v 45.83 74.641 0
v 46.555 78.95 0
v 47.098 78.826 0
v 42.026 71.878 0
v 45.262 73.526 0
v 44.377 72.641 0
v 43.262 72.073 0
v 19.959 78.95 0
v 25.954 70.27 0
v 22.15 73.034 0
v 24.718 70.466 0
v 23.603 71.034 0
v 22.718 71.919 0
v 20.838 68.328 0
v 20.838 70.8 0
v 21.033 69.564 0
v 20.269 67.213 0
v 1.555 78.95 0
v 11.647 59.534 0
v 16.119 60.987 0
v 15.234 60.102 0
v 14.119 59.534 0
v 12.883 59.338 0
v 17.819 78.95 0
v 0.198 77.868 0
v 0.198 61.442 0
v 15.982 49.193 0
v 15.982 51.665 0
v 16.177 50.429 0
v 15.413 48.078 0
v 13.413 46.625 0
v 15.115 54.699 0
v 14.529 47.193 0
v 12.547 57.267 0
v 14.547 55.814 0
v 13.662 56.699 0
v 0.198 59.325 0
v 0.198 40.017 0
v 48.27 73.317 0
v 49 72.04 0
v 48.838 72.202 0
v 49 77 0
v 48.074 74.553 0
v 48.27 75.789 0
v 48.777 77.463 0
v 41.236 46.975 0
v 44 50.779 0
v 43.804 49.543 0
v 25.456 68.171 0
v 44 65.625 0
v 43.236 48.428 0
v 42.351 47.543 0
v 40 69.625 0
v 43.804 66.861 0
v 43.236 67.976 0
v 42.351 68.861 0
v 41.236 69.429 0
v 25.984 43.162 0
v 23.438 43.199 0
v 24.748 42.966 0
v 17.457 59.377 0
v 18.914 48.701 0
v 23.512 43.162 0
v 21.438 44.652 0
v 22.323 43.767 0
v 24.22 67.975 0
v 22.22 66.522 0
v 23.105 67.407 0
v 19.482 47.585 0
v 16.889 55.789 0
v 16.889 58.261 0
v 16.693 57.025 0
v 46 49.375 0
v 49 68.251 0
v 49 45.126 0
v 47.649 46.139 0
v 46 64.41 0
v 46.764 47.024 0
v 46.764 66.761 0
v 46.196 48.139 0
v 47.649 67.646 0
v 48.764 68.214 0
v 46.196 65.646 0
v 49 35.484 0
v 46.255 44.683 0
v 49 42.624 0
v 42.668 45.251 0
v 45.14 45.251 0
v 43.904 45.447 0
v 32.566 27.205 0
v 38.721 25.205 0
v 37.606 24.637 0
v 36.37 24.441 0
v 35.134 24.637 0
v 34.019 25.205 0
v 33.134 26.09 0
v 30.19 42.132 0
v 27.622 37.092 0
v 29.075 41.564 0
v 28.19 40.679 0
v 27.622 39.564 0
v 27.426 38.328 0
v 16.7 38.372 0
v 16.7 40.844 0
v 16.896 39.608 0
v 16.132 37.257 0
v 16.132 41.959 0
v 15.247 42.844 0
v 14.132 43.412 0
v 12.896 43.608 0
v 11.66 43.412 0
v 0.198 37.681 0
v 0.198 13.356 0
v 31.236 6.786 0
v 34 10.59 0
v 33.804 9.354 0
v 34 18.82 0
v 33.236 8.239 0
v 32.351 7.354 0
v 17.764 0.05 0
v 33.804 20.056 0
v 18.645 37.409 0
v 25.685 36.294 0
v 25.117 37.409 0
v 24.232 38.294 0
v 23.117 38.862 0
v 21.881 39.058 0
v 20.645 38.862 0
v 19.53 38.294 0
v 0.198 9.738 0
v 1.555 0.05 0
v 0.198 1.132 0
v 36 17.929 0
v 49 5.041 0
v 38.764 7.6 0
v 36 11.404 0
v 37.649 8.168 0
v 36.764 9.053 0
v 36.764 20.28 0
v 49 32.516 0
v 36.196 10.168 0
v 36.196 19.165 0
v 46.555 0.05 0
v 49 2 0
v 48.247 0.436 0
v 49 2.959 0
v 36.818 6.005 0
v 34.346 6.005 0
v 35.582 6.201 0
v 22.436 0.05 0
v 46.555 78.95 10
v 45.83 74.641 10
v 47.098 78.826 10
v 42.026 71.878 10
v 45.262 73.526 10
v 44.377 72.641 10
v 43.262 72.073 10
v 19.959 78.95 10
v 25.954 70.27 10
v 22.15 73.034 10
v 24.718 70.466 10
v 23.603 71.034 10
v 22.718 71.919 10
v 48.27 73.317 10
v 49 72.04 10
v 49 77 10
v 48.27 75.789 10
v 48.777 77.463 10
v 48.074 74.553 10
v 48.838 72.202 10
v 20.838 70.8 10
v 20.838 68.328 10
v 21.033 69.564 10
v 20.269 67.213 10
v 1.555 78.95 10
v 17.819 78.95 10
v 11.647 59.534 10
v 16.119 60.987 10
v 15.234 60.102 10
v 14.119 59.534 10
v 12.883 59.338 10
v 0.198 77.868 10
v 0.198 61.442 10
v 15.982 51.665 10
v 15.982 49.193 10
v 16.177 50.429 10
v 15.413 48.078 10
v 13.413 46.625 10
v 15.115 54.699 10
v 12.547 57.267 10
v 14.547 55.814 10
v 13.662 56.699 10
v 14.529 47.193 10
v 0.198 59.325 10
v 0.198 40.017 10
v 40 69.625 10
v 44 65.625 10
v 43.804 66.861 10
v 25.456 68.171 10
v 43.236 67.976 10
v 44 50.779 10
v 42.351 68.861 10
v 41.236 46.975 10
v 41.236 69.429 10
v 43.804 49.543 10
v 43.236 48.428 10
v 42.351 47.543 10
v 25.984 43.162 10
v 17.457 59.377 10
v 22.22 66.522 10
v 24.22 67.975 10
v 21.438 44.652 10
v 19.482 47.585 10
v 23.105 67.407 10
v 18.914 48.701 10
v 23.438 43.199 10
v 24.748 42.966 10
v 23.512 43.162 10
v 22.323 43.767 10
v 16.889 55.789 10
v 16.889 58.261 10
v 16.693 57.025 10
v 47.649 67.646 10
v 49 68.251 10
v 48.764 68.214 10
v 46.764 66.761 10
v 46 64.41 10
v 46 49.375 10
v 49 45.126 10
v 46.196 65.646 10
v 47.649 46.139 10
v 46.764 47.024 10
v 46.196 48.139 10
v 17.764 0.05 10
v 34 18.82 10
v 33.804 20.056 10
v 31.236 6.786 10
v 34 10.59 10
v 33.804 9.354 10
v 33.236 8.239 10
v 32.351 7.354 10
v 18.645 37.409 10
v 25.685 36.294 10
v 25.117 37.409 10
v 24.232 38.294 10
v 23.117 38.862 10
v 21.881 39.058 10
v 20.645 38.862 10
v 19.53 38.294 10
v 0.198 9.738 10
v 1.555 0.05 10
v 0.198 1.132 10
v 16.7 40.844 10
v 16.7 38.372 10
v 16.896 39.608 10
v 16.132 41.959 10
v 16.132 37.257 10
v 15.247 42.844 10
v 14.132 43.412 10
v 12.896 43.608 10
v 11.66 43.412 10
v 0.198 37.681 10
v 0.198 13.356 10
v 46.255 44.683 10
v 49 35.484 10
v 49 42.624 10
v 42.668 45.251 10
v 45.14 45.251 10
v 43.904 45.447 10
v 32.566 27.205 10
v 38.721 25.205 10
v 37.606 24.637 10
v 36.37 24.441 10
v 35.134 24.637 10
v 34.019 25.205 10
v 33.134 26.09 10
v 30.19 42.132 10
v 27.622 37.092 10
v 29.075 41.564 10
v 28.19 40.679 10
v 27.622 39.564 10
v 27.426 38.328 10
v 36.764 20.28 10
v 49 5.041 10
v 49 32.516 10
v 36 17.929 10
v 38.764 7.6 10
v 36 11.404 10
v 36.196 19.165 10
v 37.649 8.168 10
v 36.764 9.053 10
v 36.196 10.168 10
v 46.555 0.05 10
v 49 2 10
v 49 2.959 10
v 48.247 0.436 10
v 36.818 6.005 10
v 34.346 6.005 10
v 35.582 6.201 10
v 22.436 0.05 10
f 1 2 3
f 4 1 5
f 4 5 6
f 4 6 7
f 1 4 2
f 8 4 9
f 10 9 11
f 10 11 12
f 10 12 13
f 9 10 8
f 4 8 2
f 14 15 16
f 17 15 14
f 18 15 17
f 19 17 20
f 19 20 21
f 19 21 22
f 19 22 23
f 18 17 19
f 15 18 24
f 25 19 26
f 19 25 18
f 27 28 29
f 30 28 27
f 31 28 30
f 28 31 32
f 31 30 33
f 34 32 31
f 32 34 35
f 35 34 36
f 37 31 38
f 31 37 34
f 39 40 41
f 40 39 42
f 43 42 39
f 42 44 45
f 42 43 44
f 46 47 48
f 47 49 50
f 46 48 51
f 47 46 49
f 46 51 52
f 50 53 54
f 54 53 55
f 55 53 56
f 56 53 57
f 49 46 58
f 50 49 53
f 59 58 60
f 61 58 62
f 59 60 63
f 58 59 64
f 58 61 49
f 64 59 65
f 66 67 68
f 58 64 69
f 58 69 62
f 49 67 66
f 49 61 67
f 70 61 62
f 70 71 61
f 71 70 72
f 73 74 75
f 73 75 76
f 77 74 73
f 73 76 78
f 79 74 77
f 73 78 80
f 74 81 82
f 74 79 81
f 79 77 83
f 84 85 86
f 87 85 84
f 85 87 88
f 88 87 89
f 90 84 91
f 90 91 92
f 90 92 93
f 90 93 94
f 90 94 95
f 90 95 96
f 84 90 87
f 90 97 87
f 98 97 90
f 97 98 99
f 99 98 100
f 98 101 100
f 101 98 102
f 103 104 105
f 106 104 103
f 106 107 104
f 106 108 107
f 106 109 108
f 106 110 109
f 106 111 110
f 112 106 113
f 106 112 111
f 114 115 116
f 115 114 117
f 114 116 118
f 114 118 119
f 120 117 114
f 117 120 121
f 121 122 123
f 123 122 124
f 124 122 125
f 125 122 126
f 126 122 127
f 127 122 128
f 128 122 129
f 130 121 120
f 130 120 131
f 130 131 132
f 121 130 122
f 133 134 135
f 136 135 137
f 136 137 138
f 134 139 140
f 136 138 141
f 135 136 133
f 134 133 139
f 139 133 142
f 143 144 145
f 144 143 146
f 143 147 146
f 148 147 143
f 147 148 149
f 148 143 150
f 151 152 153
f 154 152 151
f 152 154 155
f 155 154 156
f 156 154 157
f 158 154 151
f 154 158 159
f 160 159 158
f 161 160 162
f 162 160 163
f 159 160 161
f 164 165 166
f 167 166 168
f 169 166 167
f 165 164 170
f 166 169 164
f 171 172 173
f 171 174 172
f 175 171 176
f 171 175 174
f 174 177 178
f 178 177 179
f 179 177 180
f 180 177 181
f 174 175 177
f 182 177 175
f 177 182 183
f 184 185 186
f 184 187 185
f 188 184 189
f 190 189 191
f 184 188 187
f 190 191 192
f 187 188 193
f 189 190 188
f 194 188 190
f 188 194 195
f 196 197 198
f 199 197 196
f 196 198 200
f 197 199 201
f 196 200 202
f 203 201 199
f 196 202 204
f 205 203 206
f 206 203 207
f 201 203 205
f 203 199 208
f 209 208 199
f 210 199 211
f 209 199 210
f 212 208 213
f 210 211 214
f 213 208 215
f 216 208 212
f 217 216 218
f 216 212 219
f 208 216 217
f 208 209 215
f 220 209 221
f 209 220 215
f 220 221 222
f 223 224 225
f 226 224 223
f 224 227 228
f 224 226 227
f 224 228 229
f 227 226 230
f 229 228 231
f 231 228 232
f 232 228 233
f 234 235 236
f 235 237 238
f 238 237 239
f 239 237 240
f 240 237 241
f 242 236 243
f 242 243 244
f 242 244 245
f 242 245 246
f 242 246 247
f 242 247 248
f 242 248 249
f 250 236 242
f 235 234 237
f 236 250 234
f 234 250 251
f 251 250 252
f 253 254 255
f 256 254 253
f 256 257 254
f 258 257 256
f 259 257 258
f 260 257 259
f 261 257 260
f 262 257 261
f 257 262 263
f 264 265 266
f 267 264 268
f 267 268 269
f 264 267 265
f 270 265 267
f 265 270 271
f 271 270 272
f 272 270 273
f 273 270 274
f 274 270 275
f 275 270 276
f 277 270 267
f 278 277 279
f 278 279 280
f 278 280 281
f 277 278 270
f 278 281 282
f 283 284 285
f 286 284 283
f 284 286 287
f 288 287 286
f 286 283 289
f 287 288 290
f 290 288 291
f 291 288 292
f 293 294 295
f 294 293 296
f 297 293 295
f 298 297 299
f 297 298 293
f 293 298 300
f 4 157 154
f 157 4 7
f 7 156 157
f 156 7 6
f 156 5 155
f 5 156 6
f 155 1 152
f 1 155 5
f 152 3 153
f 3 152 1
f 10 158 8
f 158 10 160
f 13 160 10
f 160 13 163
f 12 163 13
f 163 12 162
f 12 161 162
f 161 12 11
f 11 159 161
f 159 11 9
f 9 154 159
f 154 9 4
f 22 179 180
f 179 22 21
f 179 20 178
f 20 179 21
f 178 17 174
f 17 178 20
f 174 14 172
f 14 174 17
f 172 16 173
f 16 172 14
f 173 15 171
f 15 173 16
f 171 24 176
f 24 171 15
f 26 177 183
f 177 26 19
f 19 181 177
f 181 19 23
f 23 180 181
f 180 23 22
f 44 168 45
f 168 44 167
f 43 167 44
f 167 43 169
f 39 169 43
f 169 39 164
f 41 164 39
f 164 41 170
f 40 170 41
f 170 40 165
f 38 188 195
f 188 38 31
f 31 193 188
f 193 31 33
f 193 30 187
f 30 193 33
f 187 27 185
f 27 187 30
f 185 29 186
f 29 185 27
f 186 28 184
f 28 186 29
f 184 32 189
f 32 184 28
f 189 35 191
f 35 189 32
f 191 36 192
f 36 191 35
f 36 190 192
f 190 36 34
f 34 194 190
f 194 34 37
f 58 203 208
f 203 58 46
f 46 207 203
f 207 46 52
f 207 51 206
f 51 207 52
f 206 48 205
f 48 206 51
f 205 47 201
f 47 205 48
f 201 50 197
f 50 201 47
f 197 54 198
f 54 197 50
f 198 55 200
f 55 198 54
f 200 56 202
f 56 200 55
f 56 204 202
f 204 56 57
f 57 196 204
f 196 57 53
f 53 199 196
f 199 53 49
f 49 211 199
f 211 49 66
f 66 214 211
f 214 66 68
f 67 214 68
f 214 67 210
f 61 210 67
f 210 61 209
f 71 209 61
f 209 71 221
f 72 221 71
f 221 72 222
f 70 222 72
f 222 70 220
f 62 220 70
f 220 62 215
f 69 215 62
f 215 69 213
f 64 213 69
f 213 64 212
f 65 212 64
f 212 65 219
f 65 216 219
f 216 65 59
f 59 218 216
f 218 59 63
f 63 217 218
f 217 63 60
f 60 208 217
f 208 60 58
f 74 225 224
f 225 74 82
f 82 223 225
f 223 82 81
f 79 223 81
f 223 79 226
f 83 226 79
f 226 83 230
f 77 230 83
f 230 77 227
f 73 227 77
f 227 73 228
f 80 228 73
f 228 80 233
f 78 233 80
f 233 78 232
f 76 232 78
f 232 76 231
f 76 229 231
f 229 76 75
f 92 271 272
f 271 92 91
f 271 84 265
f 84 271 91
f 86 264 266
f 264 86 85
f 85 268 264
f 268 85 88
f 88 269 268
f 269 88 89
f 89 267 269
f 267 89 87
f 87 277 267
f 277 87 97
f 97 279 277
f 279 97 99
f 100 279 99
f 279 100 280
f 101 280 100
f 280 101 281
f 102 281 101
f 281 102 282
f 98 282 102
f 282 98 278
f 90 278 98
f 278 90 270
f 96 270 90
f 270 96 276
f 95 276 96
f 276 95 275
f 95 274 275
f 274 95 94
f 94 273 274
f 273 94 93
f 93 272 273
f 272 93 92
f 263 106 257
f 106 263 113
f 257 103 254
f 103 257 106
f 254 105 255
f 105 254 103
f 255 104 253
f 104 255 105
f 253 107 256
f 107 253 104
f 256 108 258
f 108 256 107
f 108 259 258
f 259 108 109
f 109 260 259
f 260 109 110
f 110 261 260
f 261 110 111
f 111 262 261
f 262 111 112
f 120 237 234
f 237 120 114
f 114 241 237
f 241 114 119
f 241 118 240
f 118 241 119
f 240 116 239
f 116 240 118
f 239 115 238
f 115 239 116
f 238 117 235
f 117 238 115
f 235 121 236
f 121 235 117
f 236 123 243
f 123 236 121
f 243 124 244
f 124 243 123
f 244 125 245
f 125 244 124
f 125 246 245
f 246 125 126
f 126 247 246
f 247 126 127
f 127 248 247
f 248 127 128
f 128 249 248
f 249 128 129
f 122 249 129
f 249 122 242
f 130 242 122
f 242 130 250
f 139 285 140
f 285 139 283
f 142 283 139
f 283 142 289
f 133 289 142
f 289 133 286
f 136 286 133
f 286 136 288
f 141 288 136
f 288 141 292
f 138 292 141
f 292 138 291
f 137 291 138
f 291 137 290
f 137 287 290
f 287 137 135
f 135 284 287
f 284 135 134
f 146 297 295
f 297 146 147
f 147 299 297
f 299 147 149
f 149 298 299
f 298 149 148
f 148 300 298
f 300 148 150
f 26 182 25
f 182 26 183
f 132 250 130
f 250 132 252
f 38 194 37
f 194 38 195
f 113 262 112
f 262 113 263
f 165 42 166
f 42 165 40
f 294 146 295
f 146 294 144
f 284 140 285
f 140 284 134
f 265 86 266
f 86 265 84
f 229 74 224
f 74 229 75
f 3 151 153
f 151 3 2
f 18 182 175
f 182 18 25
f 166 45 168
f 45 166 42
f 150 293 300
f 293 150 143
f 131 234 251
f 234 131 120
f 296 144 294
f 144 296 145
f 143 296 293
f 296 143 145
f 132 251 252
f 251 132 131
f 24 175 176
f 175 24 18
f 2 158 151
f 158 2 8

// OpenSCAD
// (c)2013 Felipe Sanches <juca@members.fsf.org>
// licensed under the terms of the GNU GPL version 3 (or later)

function normalize(v) = v/(sqrt(v[0]*v[0] + v[1]*v[1]));

module voronoi(points, L=200, thickness=1, round=6, nuclei=true){
	for (p=points){
		difference(){
			minkowski(){
			intersection_for(p1=points){
				if (p!=p1){
					translate((p+p1)/2 - normalize(p1-p) * (thickness+round))
					assign(angle=90+atan2(p[1]-p1[1], p[0]-p1[0])){
						rotate([0,0,angle])
						translate([-L,-L])
						square([2*L, L]);
					}
				}
			}
			circle(r=round, $fn=20);
			}
			if (nuclei)
			translate(p) circle(r=1, $fn=20);
		}
	}
}


module random_voronoi(n=20, nuclei=true, L=200, thickness=1, round=6, min=0, max=100, seed=42){

	x = rands(min, max, n, seed);
	y = rands(min, max, n, seed+1);

	for (i=[0:n-1]){
		difference(){
			minkowski(){
			intersection_for(j=[0:n-1]){
				if (i!=j){
					assign(p=[x[i],y[i]], p1=[x[j],y[j]]){
						translate((p+p1)/2 - normalize(p1-p) * (thickness+round))
						assign(angle=90+atan2(p[1]-p1[1], p[0]-p1[0])){
							rotate([0,0,angle])
							translate([-L,-L])
							square([2*L, L]);
						}
					}
				}
			}
			circle(r=round, $fn=20);
			}
			if (nuclei)
			translate([x[i],y[i]]) circle(r=1, $fn=20);
		}
	}
}

// example with an explicit list of points:
//point_set = [[0,0],[30,0],[20,10],[50,20],[15,30],[85,30],[35,30],[12,60], [45,50],[80,80],[20,-40],[-20,20],[-15,10],[-15,50]];

module pattern() {
point_set = [[0,0],[30,0],[20,10],[50,20],[15,30],[85,30],[35,30],[12,60], [45,50],[80,80],[20,-40],[-20,20],[-15,10],[-15,50]];
intersection() {
	translate([20,25,0])
	linear_extrude(height = 10)
	voronoi(points=point_set, round=4, nuclei=false);
	translate([2,2,-1])
	minkowski() {
		cylinder(r=2, h=1);
		cube([55-4-6, 87+2-4-10, 10]);
	}
}

//cube([55-6, 89-10, 1]);
}

pattern();

// example with randomly generated set of points
//random_voronoi(n=64, round=6, min=0, max=300);
